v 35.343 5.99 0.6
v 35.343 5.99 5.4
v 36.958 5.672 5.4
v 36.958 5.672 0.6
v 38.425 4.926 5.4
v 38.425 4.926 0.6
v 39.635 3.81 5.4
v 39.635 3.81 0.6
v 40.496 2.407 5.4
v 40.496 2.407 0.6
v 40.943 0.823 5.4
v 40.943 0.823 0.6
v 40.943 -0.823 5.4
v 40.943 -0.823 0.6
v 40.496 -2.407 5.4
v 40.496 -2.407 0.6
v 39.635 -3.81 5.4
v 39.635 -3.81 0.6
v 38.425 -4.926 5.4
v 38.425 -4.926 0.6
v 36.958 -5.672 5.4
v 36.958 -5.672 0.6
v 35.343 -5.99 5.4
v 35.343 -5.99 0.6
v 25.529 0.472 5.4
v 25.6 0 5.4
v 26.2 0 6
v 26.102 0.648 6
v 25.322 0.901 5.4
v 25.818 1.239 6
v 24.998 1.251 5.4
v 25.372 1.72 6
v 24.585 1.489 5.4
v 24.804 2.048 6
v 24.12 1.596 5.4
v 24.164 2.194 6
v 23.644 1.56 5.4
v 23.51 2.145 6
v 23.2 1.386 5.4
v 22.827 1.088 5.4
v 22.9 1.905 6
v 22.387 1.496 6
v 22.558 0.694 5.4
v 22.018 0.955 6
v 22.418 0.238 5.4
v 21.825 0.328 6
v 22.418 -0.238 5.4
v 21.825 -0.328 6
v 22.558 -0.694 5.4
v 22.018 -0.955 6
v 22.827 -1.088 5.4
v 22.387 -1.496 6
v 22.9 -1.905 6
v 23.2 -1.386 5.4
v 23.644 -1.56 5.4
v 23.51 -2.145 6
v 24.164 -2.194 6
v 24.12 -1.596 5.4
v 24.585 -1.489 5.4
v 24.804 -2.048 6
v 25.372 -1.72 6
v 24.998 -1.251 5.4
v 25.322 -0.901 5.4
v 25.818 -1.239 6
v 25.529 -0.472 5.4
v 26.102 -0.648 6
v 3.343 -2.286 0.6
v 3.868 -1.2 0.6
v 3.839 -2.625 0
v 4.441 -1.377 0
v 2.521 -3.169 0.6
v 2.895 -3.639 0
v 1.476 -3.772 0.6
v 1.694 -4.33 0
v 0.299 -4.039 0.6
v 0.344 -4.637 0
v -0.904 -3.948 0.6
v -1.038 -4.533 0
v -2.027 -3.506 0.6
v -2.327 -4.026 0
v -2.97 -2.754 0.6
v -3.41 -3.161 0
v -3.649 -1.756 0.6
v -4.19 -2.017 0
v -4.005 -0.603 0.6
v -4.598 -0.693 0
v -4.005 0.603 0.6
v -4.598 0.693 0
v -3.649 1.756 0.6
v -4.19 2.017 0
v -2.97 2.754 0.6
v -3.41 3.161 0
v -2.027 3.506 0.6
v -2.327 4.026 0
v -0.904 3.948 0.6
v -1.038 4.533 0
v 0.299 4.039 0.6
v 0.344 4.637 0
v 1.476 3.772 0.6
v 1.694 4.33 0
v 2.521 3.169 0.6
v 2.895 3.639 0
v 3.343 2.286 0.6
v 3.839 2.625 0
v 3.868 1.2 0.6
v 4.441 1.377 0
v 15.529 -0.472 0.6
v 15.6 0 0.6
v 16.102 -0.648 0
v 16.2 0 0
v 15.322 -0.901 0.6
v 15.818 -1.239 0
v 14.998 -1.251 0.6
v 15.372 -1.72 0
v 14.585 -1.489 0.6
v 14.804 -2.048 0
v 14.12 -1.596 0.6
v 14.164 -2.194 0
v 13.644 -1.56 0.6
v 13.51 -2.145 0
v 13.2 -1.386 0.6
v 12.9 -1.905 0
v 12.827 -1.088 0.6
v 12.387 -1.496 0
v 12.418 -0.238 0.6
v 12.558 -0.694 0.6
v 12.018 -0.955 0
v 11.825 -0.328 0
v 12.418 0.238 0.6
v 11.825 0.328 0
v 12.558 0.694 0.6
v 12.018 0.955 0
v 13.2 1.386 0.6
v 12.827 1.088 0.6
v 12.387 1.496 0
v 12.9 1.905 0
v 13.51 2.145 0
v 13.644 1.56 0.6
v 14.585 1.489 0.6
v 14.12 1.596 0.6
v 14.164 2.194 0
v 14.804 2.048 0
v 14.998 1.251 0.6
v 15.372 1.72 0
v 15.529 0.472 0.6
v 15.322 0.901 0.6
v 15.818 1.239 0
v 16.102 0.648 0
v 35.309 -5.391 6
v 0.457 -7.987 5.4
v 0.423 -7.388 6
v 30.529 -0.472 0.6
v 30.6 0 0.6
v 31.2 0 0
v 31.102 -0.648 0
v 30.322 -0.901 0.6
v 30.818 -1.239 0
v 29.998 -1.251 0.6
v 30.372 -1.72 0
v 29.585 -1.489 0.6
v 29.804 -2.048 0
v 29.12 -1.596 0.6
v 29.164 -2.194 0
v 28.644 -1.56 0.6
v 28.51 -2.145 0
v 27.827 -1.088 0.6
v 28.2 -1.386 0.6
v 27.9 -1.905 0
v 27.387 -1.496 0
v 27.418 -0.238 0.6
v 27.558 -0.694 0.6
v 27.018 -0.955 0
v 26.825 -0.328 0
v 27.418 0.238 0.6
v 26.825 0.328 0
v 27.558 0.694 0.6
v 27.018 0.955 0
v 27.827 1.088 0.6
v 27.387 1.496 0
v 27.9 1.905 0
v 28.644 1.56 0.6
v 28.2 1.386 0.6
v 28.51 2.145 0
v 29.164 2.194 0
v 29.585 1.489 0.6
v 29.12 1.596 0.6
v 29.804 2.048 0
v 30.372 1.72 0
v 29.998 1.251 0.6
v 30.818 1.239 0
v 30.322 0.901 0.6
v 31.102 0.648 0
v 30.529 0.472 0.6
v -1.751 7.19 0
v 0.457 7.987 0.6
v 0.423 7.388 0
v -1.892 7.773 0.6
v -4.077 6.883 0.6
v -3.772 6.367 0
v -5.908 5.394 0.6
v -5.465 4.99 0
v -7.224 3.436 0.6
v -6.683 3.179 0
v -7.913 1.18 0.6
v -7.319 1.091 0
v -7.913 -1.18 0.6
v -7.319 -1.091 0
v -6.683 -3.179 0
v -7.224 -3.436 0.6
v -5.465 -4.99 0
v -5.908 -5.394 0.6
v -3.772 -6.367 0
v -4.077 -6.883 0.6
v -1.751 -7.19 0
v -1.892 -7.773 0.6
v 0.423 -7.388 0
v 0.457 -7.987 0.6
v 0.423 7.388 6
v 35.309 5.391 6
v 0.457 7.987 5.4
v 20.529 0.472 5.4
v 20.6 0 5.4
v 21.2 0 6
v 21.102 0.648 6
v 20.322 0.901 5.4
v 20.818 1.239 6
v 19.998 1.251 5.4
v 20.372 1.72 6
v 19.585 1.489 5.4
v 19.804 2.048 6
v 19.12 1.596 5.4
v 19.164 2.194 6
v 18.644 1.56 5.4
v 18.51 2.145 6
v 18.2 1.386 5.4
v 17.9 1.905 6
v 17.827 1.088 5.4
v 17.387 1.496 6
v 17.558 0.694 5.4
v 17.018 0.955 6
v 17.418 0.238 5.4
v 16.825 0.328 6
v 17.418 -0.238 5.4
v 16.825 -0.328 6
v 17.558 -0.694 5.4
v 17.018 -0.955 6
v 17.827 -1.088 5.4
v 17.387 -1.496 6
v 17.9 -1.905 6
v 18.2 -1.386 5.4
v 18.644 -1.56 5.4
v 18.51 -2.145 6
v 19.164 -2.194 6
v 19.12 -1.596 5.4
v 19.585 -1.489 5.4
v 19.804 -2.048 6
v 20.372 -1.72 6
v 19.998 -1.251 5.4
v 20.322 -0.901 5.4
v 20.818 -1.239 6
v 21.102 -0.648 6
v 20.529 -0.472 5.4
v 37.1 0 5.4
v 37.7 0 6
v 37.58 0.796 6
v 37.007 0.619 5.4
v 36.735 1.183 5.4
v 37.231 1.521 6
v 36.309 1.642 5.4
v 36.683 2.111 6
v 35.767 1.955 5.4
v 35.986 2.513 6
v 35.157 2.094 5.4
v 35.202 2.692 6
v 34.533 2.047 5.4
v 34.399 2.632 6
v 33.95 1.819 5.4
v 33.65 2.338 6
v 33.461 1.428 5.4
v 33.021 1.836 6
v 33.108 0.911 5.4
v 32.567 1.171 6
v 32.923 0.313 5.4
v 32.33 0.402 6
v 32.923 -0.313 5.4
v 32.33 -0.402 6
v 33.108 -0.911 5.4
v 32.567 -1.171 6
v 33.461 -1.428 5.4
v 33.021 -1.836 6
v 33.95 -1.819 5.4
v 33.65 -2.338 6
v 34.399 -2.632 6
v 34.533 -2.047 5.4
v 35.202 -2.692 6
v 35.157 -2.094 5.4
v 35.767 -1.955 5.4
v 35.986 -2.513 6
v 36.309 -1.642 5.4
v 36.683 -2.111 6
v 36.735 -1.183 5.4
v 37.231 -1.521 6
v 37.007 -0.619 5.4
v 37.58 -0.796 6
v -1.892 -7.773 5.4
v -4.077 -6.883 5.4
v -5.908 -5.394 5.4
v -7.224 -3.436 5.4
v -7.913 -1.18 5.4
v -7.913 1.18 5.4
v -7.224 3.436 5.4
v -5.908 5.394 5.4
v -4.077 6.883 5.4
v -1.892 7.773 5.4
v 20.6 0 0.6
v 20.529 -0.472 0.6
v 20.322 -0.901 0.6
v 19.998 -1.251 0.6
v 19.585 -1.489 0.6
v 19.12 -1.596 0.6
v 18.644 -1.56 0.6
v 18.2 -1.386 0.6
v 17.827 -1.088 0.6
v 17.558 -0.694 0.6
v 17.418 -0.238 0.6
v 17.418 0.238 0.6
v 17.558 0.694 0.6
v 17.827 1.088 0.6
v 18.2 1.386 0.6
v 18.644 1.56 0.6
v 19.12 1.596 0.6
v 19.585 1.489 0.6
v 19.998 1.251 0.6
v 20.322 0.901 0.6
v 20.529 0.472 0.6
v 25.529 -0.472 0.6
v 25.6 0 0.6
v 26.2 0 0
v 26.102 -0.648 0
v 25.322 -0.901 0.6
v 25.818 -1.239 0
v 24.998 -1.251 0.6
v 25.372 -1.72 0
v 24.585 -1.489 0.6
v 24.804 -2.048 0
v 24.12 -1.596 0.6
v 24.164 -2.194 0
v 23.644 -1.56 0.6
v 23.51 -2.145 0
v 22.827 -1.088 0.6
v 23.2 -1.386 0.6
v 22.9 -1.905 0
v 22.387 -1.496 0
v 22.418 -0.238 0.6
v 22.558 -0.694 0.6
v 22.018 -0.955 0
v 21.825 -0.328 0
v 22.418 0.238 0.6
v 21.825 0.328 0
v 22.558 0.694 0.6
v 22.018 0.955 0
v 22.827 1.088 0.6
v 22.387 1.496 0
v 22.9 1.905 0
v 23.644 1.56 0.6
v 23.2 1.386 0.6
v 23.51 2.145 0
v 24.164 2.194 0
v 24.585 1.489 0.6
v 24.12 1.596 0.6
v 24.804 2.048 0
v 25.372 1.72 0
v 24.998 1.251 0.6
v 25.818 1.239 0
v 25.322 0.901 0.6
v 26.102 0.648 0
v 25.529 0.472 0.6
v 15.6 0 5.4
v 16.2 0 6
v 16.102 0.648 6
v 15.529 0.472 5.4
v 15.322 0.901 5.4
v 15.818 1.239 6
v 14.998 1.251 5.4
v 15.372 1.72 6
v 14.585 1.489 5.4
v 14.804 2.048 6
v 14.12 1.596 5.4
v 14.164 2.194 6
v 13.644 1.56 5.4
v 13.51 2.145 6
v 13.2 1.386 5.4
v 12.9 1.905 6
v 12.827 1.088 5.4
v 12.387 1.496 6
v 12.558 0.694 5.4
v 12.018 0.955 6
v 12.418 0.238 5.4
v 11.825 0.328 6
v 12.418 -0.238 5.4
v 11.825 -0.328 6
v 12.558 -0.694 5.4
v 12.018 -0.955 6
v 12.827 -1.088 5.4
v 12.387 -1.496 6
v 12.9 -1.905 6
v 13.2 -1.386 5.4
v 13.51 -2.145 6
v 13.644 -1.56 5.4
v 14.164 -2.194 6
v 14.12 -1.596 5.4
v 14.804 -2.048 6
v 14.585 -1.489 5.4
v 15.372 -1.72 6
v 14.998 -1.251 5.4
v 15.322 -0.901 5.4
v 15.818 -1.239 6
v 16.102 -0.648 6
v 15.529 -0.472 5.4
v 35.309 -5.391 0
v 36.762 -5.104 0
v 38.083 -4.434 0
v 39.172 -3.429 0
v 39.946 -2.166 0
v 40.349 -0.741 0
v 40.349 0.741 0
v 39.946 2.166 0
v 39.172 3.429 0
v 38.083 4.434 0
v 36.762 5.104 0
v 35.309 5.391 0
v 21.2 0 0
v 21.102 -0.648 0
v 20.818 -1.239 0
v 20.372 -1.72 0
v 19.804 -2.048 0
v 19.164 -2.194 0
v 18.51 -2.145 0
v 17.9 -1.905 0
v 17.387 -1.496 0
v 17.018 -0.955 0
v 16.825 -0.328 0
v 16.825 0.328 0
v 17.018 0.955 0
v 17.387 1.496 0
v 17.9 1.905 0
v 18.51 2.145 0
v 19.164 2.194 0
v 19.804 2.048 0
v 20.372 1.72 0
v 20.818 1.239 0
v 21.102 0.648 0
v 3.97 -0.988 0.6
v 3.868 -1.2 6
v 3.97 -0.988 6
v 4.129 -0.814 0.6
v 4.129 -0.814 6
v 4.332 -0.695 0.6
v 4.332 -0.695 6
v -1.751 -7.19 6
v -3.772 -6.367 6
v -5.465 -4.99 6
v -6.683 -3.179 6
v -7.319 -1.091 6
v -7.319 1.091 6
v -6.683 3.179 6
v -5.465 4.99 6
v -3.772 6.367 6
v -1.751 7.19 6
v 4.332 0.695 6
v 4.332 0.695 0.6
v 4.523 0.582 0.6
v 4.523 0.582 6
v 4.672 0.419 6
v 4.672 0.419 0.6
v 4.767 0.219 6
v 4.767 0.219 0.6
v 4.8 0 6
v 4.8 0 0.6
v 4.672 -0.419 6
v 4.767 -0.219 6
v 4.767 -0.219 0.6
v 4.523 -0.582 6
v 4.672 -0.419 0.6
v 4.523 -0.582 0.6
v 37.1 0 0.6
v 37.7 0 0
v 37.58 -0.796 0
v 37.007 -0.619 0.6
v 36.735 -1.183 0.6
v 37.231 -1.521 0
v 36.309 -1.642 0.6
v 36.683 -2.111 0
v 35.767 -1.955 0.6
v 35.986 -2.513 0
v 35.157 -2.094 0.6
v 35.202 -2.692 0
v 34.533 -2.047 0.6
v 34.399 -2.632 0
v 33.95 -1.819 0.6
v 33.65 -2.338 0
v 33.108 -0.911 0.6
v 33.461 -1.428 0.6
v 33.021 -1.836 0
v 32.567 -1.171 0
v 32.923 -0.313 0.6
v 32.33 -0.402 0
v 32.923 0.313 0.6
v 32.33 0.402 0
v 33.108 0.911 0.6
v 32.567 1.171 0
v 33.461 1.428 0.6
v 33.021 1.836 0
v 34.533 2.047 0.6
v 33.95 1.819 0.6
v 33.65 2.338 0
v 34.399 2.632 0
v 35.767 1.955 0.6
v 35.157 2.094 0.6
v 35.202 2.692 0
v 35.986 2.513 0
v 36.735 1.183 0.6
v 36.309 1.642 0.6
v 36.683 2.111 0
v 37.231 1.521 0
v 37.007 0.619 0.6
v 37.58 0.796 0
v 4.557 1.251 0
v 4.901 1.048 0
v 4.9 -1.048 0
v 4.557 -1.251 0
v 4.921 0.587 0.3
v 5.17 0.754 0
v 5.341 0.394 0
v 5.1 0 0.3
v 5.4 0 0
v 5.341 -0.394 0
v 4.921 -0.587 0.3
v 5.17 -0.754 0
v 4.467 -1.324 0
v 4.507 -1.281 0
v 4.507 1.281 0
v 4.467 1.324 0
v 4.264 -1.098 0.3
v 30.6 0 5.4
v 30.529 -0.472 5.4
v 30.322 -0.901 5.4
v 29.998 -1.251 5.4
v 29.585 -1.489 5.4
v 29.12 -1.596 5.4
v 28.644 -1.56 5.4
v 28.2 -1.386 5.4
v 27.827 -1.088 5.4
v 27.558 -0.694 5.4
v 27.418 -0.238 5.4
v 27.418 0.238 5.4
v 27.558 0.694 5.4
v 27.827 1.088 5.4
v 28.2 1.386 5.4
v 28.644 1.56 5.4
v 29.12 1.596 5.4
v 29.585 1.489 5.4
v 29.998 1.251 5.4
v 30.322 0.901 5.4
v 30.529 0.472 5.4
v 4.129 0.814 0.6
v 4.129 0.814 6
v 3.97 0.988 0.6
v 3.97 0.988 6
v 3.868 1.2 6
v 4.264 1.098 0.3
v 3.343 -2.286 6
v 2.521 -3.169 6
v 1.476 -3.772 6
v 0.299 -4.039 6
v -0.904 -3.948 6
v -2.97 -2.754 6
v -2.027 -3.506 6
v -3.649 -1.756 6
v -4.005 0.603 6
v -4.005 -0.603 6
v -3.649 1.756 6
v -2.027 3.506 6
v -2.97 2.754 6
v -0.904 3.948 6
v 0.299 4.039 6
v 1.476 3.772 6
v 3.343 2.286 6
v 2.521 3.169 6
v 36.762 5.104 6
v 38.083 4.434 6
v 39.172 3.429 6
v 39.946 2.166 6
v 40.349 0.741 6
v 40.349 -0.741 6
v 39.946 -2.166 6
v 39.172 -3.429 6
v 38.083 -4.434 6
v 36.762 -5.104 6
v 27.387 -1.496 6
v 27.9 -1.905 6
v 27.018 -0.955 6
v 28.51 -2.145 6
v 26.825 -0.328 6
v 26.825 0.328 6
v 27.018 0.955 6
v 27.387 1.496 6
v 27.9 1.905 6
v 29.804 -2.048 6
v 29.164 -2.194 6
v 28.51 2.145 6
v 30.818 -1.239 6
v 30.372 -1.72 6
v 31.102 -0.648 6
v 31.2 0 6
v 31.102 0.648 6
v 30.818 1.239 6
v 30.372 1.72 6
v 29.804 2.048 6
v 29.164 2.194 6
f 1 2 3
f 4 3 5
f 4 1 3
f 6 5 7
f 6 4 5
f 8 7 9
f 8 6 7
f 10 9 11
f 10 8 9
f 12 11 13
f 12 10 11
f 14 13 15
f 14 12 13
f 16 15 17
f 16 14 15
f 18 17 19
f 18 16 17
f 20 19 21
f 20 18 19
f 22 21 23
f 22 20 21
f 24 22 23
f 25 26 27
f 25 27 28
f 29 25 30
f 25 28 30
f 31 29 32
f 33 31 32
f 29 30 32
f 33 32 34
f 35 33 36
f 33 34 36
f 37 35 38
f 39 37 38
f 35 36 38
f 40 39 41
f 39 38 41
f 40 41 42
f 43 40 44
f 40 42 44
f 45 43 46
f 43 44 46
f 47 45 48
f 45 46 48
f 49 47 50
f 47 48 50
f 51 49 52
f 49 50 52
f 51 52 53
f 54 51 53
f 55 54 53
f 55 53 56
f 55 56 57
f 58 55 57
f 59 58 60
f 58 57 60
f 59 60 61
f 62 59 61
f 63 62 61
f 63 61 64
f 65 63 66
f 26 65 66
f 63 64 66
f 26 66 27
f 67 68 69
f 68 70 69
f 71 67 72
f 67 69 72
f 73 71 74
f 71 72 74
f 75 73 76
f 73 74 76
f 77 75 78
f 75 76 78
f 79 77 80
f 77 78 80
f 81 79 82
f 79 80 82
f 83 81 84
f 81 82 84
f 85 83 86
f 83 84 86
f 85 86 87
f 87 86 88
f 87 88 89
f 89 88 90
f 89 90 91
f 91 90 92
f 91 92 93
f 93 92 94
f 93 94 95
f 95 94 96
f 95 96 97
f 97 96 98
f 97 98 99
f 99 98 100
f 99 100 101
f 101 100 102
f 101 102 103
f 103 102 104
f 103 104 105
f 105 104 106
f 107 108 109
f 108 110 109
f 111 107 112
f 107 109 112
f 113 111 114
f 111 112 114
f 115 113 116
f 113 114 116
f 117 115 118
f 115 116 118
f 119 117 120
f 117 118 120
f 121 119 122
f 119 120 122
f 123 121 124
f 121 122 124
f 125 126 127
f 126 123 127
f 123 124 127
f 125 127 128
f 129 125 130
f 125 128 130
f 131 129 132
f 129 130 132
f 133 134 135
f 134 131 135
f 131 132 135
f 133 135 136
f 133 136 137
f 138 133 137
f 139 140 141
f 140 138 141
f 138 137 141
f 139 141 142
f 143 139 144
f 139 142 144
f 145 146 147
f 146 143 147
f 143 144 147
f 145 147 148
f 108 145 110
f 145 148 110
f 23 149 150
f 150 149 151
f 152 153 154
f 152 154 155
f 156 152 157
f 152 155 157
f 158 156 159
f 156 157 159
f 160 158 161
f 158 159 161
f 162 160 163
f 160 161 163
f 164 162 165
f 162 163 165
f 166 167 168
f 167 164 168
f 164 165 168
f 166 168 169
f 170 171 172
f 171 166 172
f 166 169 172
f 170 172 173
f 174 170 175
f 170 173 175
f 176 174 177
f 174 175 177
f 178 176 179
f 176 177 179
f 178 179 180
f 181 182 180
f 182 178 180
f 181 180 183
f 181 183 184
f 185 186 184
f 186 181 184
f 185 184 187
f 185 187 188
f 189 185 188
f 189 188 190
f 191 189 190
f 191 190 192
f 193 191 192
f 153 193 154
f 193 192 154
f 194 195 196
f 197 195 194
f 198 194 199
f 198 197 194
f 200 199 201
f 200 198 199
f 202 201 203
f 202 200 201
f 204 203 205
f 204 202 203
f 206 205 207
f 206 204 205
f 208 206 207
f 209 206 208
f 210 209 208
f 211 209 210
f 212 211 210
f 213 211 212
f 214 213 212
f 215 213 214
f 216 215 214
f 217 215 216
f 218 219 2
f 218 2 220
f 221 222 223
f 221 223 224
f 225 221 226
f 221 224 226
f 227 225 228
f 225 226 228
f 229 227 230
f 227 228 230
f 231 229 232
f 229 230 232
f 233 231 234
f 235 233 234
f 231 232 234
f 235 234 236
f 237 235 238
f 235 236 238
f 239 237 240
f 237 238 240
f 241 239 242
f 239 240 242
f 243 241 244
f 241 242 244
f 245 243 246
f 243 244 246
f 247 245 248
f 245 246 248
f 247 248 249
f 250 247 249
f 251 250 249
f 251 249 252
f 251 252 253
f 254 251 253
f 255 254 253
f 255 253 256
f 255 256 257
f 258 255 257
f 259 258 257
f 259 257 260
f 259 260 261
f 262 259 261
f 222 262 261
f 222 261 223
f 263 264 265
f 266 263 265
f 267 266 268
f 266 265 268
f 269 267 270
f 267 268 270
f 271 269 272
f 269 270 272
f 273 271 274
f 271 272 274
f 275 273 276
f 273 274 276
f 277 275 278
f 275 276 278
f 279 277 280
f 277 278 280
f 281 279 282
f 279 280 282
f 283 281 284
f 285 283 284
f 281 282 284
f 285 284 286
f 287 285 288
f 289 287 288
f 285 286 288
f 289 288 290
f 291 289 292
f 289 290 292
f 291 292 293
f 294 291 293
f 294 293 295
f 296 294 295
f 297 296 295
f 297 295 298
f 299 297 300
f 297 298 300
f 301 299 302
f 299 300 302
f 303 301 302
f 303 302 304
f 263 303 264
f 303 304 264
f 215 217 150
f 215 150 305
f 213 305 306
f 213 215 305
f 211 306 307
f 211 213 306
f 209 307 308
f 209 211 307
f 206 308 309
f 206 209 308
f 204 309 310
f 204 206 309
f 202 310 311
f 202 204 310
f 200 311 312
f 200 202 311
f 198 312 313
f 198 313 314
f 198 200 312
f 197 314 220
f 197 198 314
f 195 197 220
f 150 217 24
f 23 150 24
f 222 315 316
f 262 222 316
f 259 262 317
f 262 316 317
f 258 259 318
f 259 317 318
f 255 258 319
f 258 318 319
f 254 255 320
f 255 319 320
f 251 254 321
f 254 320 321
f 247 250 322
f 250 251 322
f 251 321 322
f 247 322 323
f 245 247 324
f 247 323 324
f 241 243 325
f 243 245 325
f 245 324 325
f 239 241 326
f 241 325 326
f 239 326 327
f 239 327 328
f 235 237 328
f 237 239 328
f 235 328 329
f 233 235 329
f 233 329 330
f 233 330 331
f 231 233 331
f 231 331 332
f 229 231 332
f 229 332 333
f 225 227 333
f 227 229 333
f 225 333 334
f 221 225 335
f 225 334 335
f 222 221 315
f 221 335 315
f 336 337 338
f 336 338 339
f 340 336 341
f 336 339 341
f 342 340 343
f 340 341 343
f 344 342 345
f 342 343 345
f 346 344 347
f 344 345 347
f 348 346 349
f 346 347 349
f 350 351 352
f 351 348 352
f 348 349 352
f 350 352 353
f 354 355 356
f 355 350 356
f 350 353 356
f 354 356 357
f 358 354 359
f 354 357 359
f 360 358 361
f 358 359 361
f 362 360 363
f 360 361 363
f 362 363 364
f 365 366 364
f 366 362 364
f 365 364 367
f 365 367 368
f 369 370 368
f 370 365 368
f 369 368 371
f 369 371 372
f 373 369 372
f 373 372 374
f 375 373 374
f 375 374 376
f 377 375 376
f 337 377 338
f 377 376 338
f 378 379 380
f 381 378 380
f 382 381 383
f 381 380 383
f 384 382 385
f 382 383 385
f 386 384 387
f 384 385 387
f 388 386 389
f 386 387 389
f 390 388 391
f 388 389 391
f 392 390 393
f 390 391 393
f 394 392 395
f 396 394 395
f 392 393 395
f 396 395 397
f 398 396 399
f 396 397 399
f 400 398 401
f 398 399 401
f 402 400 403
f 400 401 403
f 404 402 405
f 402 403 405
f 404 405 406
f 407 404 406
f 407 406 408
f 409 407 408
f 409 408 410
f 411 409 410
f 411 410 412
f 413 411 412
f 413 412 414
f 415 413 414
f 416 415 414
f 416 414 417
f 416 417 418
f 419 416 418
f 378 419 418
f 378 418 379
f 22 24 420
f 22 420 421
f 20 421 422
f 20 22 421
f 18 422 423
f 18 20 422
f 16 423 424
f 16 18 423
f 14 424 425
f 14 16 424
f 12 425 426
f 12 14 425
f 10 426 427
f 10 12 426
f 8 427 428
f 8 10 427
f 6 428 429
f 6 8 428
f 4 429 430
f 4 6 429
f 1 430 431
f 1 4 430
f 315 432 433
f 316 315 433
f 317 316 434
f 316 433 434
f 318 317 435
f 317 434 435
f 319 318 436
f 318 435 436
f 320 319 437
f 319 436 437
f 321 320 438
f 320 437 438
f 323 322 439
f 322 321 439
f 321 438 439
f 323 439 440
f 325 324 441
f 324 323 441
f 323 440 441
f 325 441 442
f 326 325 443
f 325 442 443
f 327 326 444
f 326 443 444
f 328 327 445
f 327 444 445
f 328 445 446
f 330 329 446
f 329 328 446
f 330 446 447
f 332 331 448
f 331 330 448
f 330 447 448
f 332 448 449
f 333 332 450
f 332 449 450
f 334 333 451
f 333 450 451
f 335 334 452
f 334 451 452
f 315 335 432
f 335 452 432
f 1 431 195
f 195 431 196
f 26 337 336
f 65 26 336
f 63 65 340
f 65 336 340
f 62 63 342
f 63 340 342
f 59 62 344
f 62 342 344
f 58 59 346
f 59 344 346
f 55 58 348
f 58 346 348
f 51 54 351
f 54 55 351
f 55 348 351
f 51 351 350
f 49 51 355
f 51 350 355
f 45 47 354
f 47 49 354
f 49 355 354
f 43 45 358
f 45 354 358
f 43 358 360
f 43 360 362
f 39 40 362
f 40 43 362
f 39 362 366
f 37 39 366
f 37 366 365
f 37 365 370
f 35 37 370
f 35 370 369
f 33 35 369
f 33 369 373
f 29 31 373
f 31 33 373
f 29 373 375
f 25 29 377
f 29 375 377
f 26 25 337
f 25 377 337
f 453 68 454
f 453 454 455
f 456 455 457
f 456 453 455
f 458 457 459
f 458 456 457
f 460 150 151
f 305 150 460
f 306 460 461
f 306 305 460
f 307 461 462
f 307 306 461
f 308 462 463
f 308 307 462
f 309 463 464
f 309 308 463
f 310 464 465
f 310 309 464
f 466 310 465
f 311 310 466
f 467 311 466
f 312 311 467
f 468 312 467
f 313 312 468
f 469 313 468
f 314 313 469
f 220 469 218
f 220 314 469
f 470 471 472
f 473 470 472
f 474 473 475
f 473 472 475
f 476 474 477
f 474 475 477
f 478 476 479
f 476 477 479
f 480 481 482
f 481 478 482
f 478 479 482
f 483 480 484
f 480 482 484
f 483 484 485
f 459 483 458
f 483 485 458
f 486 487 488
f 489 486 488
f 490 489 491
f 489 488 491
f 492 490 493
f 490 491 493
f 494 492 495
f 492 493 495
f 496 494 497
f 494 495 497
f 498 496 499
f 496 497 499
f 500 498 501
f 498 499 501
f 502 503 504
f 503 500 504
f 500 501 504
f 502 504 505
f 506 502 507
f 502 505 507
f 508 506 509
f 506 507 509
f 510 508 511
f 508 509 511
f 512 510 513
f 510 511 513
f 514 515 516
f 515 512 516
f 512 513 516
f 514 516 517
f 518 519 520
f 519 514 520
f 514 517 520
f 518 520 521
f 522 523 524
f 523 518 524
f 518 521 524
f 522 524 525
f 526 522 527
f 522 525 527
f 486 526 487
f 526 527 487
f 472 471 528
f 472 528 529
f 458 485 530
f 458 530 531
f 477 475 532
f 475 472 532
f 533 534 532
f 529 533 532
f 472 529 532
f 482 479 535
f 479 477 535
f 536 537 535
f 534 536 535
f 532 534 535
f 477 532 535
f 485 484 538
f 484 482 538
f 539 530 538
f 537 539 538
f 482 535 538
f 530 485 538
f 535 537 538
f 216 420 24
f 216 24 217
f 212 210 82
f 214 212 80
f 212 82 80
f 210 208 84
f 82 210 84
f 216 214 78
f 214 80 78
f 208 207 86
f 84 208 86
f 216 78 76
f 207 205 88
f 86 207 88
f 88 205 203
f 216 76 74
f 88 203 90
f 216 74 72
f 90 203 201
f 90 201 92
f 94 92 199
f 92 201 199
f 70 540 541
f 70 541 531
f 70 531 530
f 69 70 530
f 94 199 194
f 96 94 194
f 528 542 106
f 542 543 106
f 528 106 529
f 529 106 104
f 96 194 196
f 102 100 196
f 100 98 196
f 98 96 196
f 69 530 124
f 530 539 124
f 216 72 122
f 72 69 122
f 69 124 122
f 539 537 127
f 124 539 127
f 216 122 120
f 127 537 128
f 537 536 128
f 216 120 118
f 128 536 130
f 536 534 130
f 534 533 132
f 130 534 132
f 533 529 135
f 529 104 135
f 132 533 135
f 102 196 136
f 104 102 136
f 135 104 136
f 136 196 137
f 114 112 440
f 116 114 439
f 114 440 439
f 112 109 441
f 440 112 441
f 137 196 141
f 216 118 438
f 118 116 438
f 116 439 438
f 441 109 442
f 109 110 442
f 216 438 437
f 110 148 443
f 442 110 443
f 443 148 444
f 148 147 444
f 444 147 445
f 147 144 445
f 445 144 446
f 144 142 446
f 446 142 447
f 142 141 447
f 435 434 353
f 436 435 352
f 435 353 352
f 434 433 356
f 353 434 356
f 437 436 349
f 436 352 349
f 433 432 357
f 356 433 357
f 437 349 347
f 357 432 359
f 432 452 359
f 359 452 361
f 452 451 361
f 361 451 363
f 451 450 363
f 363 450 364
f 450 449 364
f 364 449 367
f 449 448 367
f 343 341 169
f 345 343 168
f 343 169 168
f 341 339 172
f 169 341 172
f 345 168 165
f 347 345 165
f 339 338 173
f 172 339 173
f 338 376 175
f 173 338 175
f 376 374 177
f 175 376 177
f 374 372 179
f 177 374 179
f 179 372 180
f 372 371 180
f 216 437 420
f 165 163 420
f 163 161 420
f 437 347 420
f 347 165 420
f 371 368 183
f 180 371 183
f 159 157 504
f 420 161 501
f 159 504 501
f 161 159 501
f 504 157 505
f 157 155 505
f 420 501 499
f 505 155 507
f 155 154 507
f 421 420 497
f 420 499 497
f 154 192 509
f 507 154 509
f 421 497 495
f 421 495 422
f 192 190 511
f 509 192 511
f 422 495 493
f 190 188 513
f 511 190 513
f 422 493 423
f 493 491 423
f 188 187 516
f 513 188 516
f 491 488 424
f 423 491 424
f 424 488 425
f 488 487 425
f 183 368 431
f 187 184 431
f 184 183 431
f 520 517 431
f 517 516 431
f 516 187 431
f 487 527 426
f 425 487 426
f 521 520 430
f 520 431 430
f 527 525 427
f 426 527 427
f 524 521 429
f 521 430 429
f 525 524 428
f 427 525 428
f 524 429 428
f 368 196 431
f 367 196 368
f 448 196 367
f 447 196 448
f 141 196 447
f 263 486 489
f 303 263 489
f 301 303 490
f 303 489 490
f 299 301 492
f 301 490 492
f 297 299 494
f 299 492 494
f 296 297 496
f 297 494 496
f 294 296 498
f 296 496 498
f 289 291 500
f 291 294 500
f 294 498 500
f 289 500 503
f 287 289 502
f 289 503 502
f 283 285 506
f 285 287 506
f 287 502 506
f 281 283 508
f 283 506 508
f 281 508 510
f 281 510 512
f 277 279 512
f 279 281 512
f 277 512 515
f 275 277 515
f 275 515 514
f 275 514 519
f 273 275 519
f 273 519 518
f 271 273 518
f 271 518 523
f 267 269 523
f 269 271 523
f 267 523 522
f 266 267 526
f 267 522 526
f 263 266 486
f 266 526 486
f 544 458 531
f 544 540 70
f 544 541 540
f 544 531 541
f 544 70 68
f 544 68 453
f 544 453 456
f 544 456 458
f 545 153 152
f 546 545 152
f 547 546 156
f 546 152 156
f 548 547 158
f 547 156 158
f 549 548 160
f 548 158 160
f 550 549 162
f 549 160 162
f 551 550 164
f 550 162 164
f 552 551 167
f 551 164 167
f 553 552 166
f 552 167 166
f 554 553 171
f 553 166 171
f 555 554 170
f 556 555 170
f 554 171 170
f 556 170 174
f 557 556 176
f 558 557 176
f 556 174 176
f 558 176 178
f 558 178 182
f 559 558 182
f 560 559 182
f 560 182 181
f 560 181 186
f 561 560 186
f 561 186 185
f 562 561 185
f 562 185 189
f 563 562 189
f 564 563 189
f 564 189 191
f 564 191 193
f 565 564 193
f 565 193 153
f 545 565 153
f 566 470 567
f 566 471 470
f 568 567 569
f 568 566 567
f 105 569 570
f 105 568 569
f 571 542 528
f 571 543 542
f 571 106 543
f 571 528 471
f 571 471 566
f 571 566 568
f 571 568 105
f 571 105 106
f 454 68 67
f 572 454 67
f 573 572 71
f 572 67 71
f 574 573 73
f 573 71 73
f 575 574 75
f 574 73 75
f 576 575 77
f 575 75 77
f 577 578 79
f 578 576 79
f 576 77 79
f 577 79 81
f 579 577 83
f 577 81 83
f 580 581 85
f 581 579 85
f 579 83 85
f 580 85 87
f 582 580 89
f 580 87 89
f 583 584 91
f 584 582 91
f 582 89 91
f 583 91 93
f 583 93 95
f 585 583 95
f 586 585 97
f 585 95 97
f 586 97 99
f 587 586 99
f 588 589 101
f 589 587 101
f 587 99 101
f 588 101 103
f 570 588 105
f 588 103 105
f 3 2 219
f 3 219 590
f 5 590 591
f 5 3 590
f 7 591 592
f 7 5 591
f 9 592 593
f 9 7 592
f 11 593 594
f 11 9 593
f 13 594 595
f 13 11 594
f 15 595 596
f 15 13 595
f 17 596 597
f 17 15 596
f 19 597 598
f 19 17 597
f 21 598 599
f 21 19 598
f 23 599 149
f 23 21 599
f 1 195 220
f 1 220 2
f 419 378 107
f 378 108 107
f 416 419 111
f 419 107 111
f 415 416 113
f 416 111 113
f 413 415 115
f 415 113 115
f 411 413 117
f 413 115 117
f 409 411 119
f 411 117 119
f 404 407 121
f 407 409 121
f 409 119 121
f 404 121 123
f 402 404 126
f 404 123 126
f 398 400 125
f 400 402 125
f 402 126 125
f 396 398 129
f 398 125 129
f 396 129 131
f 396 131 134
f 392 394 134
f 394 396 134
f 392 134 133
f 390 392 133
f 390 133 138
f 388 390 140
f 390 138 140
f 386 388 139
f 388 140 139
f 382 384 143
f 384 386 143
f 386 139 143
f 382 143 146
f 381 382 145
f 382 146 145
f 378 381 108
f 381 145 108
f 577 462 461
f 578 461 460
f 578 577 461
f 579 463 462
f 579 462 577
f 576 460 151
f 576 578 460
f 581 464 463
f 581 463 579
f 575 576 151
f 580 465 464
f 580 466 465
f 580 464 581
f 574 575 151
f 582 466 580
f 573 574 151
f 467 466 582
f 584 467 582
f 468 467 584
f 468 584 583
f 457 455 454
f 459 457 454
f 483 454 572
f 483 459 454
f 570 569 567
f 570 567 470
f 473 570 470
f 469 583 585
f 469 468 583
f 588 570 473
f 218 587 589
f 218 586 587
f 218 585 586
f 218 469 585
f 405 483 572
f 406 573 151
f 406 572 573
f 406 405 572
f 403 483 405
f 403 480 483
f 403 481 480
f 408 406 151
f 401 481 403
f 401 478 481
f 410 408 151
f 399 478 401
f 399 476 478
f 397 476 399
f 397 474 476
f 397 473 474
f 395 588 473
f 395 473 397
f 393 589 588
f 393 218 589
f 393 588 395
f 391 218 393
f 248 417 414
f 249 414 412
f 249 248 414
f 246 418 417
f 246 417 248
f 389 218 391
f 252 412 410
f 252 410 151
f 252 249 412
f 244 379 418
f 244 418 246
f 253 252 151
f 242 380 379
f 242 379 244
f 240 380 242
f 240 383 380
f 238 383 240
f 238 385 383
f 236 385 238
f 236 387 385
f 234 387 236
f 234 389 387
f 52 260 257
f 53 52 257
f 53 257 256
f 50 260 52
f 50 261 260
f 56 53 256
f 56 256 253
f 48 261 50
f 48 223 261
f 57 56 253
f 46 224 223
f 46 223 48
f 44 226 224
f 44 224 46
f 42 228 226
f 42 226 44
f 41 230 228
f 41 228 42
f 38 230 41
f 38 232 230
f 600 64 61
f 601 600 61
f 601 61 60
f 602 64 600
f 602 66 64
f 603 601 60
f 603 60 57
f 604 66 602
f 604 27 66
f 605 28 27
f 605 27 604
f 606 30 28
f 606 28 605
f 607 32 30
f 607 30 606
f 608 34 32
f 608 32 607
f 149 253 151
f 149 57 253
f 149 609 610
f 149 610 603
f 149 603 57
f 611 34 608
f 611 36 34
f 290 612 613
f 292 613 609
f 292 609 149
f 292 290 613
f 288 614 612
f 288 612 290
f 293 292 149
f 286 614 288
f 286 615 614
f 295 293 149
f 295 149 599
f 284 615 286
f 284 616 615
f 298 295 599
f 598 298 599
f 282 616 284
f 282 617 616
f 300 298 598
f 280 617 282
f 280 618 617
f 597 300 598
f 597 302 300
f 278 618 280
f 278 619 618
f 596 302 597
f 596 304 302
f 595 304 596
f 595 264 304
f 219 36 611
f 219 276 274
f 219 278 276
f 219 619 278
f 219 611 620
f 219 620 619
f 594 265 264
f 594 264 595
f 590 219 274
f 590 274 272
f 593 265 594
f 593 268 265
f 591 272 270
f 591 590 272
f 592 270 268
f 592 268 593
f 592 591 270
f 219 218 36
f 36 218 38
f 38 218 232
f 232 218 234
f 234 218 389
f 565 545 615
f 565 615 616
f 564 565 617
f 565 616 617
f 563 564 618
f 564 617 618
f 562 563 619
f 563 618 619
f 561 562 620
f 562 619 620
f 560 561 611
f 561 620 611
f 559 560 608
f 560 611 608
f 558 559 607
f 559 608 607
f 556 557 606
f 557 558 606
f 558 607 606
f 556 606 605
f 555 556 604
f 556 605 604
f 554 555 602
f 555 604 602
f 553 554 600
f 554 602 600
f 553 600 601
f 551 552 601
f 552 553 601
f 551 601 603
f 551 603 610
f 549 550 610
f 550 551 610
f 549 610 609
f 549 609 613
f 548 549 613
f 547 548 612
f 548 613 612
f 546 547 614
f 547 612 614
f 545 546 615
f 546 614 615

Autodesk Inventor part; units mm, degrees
ref_plane "YZ Plane" through (0, 0, 0) normal (1, 0, 0) x (0, 1, 0)
ref_plane "XZ Plane" through (0, 0, 0) normal (0, 1, 0) x (-1, 0, 0)
ref_plane "XY Plane" through (0, 0, 0) normal (0, 0, 1) x (1, 0, 0)
sketch "Эскиз1" plane through (0, 0, 0) normal (0, 0, 1) x (1, 0, 0)
  arc A0 (3.8683, 1.1995) -> (3.8683, -1.1995) centre (0, 0) ccw
  circle A1 centre (14, 0) radius 1.6
  line L0 (-17.8, 0) -> (50.8, 0) construction
  circle A2 centre (0, 0) radius 8
  circle A3 centre (35, 0) radius 6
  circle A4 centre (35, 0) radius 2.1
  line L1 (0.4571, 7.9869) -> (35.3429, 5.9902)
  line L2 (0.4571, -7.9869) -> (35.3429, -5.9902)
  circle A5 centre (19, 0) radius 1.6
  circle A6 centre (24, 0) radius 1.6
  circle A7 centre (29, 0) radius 1.6
  arc A8 (4.3318, -0.695) -> (4.3318, 0.695) centre (4.05, 0) ccw
  arc A9 (4.05, 0) -> (3.8683, 1.1995) centre (0, 0) ccw construction
  arc A10 (3.8683, -1.1995) -> (4.05, 0) centre (0, 0) ccw construction
  arc A11 (3.8683, 1.1995) -> (4.3318, 0.695) centre (4.6324, 1.4364) ccw
  arc A12 (4.3318, -0.695) -> (3.8683, -1.1995) centre (4.6324, -1.4364) ccw
  dimension "d0" = 8.1
  dimension "d1" = 3.2
  dimension "d2" = 14
  dimension "d3" = 16
  dimension "d5" = 12
  dimension "d6" = 35
  dimension "d7" = 4.2
  dimension "d22" = 5
  dimension "d27" = 1.5
  dimension "d28" = 0.8
extrude "Выдавливание1" add sketch "Эскиз1" along normal blind 6 contours A2 | A2 L1 A3 A7 L2 | A3 A7 picked at (31.3752, 2.1355)
chamfer "Фаска1" distance 0.6 angle 45 22 edges at (17.9, -6.9886, 0) (41, 0, 0) (17.9, 6.9886, 0) (-8, 0, 0) (12.4, 0, 0) (32.9, 0, 0) (17.9, 6.9886, 6) (-8, 0, 6) (17.9, -6.9886, 6) (41, 0, 6) (12.4, 0, 6) (32.9, 0, 6) (17.4, 0, 6) (22.4, 0, 6) (27.4, 0, 6) (27.4, 0, 0) (22.4, 0, 0) (17.4, 0, 0) (-4.05, 0, 0) (4.0433, 0.8951, 0) (4.8, 0, 0) (4.0433, -0.8951, 0)
properties part number "Рычаг натяжителя"
